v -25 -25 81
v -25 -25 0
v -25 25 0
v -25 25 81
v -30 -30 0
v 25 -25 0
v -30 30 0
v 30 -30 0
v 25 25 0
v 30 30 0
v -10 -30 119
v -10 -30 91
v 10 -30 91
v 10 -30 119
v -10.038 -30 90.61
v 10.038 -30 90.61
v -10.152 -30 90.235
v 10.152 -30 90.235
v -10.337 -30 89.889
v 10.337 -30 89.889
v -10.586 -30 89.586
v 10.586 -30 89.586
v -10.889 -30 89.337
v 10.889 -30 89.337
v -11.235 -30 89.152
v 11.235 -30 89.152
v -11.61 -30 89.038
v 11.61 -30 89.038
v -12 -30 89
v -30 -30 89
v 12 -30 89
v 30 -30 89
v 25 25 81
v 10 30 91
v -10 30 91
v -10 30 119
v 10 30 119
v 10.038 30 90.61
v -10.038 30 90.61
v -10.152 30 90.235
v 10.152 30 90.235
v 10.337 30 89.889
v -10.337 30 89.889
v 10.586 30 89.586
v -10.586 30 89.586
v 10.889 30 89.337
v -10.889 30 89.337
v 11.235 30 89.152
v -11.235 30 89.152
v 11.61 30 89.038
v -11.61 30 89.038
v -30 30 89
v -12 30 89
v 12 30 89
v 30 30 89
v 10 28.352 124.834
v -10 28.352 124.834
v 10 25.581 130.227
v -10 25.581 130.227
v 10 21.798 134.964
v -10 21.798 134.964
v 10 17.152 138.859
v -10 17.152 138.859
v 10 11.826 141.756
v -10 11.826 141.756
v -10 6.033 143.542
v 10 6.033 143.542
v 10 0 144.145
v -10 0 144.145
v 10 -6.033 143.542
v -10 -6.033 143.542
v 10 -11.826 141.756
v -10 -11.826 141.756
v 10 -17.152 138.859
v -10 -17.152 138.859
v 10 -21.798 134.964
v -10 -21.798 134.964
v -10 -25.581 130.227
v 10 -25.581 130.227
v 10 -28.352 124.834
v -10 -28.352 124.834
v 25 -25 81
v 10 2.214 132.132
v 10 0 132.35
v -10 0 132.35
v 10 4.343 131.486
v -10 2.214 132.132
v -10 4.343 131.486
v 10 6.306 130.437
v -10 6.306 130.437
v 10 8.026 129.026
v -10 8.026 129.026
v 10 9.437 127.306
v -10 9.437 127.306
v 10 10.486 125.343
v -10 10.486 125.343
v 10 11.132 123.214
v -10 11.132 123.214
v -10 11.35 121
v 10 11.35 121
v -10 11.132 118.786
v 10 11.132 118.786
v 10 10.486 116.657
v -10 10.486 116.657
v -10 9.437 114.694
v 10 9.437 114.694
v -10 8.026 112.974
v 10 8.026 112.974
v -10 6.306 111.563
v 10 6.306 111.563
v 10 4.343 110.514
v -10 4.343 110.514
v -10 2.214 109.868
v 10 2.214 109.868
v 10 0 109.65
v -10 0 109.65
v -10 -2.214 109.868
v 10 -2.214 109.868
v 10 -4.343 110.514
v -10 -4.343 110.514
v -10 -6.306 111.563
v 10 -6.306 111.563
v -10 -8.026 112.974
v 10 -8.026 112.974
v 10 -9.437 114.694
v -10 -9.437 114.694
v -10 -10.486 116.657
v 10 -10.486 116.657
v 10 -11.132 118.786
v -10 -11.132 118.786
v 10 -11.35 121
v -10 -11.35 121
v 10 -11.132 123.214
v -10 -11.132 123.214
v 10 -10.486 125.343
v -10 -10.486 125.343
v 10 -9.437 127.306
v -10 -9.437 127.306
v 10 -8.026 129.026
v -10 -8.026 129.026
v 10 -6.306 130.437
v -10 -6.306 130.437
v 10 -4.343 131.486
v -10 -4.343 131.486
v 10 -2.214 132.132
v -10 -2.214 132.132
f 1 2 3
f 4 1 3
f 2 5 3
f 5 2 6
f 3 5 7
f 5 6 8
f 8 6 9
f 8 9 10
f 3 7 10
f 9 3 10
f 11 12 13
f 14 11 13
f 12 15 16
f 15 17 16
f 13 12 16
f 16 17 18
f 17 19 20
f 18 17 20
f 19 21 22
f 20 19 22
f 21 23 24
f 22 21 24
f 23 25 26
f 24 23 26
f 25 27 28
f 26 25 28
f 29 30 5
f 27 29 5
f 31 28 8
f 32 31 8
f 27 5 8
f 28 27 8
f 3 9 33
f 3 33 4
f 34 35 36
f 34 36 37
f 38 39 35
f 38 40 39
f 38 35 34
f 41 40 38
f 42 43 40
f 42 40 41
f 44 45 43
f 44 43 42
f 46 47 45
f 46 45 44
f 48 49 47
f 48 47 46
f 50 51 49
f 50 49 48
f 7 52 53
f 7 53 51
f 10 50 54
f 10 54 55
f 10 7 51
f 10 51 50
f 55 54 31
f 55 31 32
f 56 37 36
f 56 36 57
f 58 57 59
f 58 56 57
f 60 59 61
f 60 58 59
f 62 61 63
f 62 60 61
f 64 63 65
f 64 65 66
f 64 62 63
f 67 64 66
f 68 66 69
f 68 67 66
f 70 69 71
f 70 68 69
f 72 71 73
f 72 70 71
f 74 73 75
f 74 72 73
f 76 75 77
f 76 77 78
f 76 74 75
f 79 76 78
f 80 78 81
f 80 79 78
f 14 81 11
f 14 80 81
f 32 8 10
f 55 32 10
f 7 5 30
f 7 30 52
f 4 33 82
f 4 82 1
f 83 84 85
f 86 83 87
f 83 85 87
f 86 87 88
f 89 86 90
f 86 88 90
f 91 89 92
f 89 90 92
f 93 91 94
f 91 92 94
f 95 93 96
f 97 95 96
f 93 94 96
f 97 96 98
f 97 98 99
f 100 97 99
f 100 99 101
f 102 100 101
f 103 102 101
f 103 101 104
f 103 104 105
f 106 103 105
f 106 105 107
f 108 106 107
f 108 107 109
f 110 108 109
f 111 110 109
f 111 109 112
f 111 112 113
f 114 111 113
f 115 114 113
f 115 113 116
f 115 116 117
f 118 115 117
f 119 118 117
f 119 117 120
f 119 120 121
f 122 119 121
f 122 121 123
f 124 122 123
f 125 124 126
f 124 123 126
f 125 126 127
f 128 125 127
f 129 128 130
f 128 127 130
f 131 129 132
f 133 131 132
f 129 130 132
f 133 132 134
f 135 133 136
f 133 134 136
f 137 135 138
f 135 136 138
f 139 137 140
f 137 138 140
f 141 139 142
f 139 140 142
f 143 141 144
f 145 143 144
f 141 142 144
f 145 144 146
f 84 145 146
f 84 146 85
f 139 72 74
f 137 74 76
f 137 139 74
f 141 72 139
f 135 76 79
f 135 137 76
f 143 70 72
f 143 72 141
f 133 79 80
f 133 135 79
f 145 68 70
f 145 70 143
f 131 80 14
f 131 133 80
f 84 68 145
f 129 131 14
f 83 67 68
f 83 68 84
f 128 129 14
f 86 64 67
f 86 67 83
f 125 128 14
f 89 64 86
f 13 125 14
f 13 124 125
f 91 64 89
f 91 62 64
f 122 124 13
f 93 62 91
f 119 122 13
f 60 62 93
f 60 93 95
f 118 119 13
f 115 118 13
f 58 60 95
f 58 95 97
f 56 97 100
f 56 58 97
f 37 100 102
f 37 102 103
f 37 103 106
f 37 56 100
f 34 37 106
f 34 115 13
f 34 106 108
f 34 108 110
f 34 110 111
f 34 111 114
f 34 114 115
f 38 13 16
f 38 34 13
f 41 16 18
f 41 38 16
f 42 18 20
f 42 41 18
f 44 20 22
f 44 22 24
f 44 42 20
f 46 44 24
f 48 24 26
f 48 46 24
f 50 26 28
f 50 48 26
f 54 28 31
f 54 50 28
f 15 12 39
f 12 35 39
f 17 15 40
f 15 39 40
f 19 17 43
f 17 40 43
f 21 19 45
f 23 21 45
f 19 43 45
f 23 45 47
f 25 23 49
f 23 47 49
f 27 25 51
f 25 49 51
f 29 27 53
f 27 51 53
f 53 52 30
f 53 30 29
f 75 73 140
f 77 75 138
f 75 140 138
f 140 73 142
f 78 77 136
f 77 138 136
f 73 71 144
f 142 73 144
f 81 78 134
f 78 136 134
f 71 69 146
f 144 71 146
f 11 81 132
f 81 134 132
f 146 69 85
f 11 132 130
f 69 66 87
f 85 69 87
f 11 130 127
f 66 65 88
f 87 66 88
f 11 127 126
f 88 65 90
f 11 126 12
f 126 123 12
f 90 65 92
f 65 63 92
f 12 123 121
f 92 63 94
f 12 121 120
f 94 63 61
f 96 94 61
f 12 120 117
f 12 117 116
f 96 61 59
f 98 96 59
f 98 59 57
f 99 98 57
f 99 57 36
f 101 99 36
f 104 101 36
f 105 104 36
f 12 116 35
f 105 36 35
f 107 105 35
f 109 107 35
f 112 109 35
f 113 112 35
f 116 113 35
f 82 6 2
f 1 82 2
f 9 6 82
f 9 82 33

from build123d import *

# Parameters (mm, degrees)
SKETCH2_W           = 60
SKETCH2_H           = 60
BOSS_EXTRUDE1_DEPTH = 89
SKETCH3_W           = 20
SKETCH3_H           = 60
BOSS_EXTRUDE2_DEPTH = 30
BOSS_EXTRUDE3_DEPTH = 20
FILLET1_R           = 2
SKETCH7_W           = 50
SKETCH7_H           = 50
CUT_EXTRUDE1_DEPTH  = 81
SKETCH8_R           = 11.35
CUT_EXTRUDE2_DEPTH  = 153.570263572


with BuildPart() as part:
    # Sketch2 → Boss-Extrude1 (new body)
    with BuildSketch(Plane.XY):
        Rectangle(SKETCH2_W, SKETCH2_H)
    extrude(amount=BOSS_EXTRUDE1_DEPTH)

    # Sketch3 → Boss-Extrude2 (add)
    with BuildSketch(Plane.XY.offset(89)):
        Rectangle(SKETCH3_W, SKETCH3_H)
    extrude(amount=BOSS_EXTRUDE2_DEPTH)

    # Sketch4 → Boss-Extrude3 (add)
    with BuildSketch(Plane(origin=(10, 0, 0), x_dir=(0, 0, -1), z_dir=(1, 0, 0))):
        with BuildLine():
            Line((-119, -30), (-119, 30))
            ThreePointArc((-119, 30), (-144.144668047, 0), (-119, -30))
        make_face()
    extrude(amount=-BOSS_EXTRUDE3_DEPTH)

    # Fillet1
    fillet1_edges = [part.edges().sort_by_distance(p)[0] for p in [
        (-10, 0, 89),
        (10, 0, 89),
    ]]
    fillet(fillet1_edges, radius=FILLET1_R)

    # Sketch7 → Cut-Extrude1 (cut)
    with BuildSketch(Plane(origin=(0, 0, 0), x_dir=(-1, 0, 0), z_dir=(0, 0, -1))):
        Rectangle(SKETCH7_W, SKETCH7_H)
    extrude(amount=-CUT_EXTRUDE1_DEPTH, mode=Mode.SUBTRACT)

    # Sketch8 → Cut-Extrude2 (cut, through all)
    with BuildSketch(Plane.ZY.offset(10)):
        with Locations((121, 0)):
            Circle(SKETCH8_R)
    extrude(amount=-CUT_EXTRUDE2_DEPTH, mode=Mode.SUBTRACT)


solid = part.part
